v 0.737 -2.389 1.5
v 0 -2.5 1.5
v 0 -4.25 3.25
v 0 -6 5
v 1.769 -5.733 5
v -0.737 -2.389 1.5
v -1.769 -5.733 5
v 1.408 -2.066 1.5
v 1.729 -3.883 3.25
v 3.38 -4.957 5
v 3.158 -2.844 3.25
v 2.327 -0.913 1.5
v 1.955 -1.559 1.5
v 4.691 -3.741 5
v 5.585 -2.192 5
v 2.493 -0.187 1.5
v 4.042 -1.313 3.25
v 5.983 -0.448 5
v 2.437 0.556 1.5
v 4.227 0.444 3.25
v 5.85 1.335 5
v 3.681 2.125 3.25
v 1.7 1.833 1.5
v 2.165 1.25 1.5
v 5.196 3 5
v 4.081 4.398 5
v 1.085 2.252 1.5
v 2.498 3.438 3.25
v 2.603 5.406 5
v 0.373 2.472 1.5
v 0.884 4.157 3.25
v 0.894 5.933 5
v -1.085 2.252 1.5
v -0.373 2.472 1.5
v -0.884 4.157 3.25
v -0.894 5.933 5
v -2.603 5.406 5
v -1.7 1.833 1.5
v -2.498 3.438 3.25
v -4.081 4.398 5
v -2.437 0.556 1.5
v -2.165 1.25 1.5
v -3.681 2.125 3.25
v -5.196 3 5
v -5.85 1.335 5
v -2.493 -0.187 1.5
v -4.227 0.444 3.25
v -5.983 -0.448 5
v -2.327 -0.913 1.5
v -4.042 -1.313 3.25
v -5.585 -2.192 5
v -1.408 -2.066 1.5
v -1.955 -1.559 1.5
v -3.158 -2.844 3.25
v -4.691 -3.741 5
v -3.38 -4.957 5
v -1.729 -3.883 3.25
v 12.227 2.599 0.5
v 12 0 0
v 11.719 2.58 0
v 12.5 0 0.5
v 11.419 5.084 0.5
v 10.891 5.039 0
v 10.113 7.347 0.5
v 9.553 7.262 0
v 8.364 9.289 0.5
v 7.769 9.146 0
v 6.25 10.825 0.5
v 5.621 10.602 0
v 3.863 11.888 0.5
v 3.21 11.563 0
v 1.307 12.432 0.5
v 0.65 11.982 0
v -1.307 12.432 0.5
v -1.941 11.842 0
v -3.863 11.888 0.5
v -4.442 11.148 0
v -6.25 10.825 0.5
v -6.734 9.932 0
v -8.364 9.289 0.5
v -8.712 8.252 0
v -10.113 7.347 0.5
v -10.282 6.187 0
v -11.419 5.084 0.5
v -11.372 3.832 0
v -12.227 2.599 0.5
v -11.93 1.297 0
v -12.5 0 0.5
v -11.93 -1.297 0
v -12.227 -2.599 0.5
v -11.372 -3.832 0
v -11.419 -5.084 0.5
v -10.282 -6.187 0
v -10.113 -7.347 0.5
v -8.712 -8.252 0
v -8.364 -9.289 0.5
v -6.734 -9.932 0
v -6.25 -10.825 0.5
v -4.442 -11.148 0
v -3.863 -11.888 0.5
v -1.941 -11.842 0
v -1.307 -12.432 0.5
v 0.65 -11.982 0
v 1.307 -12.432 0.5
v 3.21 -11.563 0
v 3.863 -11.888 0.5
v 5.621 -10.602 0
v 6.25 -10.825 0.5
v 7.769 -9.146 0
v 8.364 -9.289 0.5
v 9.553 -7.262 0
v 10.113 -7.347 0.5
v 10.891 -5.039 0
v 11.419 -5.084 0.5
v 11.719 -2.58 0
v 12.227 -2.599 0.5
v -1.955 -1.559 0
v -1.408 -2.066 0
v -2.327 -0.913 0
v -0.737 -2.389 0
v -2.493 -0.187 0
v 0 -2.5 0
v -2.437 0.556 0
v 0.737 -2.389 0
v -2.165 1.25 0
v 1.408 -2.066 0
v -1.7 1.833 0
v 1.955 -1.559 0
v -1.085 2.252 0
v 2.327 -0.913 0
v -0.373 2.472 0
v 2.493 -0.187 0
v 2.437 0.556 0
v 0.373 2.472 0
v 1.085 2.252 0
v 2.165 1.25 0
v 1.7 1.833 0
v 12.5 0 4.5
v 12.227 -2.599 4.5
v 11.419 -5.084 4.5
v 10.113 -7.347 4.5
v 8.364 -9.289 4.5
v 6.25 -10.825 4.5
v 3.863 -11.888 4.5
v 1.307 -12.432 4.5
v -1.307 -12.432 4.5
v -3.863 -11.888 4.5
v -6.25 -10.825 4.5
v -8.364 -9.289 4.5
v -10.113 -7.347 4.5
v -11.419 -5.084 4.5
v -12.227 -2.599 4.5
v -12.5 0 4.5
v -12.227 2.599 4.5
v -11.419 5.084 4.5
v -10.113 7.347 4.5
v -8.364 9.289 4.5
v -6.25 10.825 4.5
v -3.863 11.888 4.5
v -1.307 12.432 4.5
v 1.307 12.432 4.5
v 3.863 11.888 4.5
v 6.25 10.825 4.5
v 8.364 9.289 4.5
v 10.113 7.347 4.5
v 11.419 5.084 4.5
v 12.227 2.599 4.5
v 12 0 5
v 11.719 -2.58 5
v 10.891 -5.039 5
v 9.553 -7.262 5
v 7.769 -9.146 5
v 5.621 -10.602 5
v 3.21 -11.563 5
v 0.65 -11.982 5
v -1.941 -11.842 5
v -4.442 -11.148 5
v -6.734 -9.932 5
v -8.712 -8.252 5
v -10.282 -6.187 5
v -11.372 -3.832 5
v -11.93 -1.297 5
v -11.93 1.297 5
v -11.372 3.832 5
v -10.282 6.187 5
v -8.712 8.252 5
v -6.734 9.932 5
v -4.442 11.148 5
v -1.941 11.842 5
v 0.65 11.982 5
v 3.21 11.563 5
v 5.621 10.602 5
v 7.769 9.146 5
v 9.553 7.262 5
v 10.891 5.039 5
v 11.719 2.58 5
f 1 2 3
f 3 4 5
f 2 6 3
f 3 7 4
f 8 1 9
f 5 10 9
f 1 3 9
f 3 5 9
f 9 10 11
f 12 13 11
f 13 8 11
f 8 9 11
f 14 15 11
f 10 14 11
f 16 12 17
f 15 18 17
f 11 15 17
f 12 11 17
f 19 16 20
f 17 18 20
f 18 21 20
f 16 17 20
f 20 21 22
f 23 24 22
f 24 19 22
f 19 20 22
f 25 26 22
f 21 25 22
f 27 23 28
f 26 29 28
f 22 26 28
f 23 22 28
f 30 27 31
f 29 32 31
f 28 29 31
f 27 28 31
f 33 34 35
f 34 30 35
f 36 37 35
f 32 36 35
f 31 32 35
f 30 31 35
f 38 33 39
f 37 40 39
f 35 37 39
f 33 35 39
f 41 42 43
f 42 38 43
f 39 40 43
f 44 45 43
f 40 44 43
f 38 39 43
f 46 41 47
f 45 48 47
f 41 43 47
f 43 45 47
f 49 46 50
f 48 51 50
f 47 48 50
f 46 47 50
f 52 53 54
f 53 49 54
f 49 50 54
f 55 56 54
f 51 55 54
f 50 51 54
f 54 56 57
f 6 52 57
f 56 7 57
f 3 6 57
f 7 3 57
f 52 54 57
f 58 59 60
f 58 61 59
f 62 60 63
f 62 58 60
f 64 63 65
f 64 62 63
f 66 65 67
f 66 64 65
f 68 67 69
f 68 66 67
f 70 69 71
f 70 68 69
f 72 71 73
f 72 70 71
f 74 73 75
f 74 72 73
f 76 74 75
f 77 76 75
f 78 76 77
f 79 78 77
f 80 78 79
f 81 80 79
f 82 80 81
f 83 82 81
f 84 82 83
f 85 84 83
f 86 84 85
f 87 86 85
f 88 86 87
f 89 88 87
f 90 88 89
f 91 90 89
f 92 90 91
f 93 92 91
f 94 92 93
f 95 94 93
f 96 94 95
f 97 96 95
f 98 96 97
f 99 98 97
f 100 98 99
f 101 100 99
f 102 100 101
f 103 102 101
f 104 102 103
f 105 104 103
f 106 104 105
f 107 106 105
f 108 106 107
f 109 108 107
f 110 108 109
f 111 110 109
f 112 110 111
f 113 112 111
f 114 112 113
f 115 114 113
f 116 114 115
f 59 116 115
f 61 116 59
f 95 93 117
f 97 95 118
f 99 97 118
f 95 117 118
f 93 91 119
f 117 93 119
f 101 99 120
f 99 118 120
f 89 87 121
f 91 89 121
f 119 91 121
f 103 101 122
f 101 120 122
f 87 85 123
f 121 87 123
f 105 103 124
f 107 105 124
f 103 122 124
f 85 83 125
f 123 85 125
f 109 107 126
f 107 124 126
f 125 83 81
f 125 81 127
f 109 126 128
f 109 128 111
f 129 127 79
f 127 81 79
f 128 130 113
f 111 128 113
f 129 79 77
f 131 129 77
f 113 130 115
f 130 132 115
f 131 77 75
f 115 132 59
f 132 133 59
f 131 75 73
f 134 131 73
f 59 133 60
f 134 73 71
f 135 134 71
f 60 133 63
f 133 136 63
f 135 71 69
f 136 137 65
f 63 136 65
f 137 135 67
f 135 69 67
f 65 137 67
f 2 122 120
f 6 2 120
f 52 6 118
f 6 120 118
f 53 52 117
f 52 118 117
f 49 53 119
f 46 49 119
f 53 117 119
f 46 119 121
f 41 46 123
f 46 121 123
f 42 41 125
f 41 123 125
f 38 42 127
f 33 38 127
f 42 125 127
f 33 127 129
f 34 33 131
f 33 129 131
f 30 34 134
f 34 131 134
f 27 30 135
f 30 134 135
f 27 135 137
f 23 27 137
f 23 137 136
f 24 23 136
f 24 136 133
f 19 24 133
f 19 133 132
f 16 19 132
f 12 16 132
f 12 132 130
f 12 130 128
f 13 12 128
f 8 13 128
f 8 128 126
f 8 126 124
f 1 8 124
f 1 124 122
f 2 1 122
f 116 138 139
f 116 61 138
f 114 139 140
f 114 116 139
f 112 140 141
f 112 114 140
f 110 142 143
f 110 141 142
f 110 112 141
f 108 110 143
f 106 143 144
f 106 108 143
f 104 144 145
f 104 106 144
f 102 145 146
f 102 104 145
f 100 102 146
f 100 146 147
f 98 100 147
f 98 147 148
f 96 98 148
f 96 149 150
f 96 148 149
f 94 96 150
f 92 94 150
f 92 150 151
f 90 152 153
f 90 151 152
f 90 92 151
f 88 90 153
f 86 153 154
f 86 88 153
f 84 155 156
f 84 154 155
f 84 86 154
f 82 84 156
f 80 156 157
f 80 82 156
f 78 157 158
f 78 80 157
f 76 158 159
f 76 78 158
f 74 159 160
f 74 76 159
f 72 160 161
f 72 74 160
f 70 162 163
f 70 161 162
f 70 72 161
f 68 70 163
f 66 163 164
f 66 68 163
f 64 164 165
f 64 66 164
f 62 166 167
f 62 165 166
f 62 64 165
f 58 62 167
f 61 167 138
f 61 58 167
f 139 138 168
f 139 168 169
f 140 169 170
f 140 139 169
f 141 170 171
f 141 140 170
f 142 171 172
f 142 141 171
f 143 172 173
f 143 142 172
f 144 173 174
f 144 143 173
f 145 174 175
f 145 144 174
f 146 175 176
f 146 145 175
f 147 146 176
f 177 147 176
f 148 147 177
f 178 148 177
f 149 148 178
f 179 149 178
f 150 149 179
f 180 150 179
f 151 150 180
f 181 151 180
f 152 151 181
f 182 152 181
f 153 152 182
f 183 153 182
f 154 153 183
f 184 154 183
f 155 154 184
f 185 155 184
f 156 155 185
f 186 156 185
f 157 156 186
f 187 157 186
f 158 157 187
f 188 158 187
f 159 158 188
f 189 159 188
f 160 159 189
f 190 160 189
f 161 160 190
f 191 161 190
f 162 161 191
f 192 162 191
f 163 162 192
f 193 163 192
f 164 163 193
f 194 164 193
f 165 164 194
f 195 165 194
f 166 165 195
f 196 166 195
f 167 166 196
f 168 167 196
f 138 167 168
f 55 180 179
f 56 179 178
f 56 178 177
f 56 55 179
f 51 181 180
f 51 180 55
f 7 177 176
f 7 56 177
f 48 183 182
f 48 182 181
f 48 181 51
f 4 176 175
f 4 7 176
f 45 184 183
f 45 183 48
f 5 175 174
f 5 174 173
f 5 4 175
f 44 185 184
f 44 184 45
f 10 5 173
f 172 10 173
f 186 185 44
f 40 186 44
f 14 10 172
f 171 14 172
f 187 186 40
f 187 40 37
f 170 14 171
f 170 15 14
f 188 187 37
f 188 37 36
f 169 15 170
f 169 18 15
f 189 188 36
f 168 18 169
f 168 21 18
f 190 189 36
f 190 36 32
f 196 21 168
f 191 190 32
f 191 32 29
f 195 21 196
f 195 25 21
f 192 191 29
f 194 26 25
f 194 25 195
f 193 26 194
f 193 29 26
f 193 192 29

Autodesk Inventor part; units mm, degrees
ref_plane "YZ Plane" through (0, 0, 0) normal (1, 0, 0) x (0, 1, 0)
ref_plane "XZ Plane" through (0, 0, 0) normal (0, 1, 0) x (-1, 0, 0)
ref_plane "XY Plane" through (0, 0, 0) normal (0, 0, 1) x (1, 0, 0)
sketch "Skizze1" plane through (0, 0, 0) normal (0, 0, 1) x (1, 0, 0)
  circle A0 centre (0, 0) radius 12.5
  dimension "d0" = 25
extrude "Extrusion1" add sketch "Skizze1" along normal blind 5
chamfer "Fasen1" distance 0.5 angle 45 2 edges at (-12.5, 0, 0) (-12.5, 0, 5)
sketch "Skizze2" plane through (0, 0, 5) normal (0, 0, 1) x (1, 0, 0)
  circle A0 centre (0, 0) radius 12 projected
hole "Bohrung1" at (0, 0, 5) direction (0, 0, -1) diameter 5 end through all countersink diameter 12 countersink angle 90
properties part number "Magnet"
